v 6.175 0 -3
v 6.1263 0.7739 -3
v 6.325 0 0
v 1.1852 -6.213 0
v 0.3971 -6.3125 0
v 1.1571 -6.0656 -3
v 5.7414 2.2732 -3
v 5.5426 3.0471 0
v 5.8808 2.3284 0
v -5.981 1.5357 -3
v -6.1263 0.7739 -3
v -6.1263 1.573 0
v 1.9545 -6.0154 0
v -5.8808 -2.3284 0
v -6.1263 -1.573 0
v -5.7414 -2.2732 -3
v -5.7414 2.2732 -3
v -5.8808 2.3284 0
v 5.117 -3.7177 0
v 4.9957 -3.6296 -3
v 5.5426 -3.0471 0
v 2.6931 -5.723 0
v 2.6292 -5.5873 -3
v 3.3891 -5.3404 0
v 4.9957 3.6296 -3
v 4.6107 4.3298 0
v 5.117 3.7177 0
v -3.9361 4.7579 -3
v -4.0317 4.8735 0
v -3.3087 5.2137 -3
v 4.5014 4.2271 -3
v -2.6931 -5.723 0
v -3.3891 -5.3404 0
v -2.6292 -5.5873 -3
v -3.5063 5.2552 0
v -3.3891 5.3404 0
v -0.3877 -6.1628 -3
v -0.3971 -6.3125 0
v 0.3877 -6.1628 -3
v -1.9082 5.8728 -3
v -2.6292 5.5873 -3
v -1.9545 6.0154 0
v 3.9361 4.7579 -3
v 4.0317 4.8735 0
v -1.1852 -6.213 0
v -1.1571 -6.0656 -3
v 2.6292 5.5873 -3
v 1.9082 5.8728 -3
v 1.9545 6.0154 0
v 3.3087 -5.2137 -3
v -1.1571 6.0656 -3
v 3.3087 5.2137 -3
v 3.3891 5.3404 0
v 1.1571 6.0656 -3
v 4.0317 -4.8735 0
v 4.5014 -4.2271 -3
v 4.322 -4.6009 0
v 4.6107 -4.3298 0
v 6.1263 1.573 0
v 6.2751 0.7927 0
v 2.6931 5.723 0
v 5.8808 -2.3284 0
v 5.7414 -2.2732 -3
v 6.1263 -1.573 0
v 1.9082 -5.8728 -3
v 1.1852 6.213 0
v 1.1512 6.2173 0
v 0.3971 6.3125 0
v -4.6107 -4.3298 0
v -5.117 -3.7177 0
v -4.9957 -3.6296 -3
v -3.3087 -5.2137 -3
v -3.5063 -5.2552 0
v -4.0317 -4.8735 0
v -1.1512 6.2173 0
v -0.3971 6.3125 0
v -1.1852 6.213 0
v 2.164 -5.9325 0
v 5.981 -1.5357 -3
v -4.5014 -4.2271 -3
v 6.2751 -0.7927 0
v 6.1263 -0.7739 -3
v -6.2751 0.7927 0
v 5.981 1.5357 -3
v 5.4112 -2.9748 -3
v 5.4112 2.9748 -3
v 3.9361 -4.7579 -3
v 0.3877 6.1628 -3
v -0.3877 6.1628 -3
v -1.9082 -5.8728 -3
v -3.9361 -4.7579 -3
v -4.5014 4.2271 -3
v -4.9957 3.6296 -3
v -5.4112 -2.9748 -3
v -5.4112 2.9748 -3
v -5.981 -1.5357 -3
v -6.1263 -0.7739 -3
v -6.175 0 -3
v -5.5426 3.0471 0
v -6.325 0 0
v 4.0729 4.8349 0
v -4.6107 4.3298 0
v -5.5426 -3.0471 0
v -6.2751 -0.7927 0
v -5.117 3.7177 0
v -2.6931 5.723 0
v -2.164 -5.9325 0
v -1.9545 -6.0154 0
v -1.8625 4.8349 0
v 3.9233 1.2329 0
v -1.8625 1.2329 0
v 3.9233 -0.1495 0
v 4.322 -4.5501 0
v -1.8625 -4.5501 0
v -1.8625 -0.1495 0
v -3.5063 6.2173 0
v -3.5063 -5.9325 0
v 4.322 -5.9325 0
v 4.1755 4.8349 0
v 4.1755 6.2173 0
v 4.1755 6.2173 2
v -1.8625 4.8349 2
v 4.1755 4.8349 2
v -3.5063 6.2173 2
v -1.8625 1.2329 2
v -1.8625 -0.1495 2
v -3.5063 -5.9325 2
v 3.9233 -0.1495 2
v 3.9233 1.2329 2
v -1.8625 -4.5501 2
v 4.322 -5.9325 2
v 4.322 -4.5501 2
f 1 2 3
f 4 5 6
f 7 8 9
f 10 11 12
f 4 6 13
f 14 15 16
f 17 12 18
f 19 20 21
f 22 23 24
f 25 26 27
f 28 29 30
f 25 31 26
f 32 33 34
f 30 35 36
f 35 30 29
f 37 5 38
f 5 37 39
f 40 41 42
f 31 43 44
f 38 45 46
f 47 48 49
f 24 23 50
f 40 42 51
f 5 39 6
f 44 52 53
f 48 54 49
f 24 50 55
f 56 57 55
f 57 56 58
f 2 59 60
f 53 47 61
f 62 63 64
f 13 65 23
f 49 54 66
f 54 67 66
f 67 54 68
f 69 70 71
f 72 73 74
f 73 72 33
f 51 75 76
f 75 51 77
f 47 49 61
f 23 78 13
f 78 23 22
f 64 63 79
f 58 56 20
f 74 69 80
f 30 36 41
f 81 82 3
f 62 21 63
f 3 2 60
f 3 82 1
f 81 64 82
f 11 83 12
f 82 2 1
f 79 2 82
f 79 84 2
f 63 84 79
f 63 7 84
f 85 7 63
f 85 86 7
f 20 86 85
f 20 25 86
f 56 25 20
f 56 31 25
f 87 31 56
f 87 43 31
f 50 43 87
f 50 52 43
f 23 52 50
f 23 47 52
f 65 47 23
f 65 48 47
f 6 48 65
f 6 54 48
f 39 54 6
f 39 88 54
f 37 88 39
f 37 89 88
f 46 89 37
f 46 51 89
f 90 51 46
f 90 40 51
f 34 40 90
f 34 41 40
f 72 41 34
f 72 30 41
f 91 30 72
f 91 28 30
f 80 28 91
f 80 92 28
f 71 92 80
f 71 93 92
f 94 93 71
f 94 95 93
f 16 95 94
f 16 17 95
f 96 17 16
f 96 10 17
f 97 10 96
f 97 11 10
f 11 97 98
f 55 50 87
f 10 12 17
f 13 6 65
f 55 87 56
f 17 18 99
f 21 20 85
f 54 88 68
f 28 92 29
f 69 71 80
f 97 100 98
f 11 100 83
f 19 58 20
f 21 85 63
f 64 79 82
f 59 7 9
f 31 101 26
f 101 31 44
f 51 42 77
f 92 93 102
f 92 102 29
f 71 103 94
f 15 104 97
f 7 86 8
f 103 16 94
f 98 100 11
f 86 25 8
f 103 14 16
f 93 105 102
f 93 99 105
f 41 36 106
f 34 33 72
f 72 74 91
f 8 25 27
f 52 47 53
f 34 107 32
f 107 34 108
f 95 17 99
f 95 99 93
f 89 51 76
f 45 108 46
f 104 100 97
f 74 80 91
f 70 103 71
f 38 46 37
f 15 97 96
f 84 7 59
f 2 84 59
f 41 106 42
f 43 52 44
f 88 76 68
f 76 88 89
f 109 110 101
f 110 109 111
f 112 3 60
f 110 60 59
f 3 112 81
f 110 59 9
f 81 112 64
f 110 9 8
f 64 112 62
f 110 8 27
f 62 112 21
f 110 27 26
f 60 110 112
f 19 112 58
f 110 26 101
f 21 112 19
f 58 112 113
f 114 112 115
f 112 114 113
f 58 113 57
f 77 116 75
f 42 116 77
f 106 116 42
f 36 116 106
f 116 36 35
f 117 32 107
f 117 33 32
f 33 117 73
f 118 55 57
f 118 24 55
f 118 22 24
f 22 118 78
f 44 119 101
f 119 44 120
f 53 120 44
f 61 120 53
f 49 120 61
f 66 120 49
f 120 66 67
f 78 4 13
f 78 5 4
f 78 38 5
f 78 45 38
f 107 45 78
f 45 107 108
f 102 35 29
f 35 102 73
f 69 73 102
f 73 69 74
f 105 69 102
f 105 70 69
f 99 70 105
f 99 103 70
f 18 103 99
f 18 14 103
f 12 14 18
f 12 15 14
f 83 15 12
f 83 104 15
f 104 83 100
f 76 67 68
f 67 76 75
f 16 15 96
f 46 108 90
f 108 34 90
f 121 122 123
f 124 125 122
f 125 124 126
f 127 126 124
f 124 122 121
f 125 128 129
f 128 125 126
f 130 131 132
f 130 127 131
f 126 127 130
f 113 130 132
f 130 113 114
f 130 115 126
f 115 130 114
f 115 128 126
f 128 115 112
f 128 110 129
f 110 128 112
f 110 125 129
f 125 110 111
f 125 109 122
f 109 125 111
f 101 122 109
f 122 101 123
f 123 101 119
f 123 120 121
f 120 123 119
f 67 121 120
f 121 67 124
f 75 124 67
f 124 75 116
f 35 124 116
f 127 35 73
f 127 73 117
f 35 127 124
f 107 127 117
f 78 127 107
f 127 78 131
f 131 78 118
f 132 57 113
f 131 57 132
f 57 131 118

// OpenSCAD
$fn = 50;

difference() {
	union() {
		translate(v = [0, 0, -3.0]) {
			cylinder(h = 3, r1 = 6.175, r2 = 6.325);
		}
		linear_extrude(height = 2) {
			text(font = "Impact", halign = "center", size = 12, text = "E", valign = "center");
		}
	}
	union();
}
